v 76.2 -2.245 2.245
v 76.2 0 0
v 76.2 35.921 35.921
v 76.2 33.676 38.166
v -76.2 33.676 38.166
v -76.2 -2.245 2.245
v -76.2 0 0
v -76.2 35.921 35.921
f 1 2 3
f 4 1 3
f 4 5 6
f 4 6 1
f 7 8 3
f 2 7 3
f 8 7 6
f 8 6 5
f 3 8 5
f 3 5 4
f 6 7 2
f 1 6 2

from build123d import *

# Parameters (mm, degrees)
F1_W     = 152.4
F1_H     = 50.8
F2_DEPTH = 3.175
F4_D     = 1.778
F4_DEPTH = 12.2464285714
F4_TIP   = 0.5341650903


with BuildPart() as f2:
    # F1 (on face) → F2 (new body)
    with BuildSketch(Plane(origin=(0, 0, 0), x_dir=(1, 0, 0), z_dir=(0, -0.7071067812, 0.7071067812))):
        with Locations((0, 25.4)):
            Rectangle(F1_W, F1_H)
    extrude(amount=F2_DEPTH)

    # F4
    with Locations(Plane.YZ.offset(76.2)):
        with Locations((3.3675965891, 5.6126595319)):
            Hole(F4_D / 2, depth=F4_DEPTH)
            with Locations((0, 0, -(F4_DEPTH + F4_TIP / 2))):  # 118° drill point
                Cone(0, F4_D / 2, F4_TIP, mode=Mode.SUBTRACT)

    # F5: F2 across plane


with BuildPart() as f2_1:
    add(f2.part)
    add(f2.part.mirror(Plane.YZ))


solid = f2_1.part
